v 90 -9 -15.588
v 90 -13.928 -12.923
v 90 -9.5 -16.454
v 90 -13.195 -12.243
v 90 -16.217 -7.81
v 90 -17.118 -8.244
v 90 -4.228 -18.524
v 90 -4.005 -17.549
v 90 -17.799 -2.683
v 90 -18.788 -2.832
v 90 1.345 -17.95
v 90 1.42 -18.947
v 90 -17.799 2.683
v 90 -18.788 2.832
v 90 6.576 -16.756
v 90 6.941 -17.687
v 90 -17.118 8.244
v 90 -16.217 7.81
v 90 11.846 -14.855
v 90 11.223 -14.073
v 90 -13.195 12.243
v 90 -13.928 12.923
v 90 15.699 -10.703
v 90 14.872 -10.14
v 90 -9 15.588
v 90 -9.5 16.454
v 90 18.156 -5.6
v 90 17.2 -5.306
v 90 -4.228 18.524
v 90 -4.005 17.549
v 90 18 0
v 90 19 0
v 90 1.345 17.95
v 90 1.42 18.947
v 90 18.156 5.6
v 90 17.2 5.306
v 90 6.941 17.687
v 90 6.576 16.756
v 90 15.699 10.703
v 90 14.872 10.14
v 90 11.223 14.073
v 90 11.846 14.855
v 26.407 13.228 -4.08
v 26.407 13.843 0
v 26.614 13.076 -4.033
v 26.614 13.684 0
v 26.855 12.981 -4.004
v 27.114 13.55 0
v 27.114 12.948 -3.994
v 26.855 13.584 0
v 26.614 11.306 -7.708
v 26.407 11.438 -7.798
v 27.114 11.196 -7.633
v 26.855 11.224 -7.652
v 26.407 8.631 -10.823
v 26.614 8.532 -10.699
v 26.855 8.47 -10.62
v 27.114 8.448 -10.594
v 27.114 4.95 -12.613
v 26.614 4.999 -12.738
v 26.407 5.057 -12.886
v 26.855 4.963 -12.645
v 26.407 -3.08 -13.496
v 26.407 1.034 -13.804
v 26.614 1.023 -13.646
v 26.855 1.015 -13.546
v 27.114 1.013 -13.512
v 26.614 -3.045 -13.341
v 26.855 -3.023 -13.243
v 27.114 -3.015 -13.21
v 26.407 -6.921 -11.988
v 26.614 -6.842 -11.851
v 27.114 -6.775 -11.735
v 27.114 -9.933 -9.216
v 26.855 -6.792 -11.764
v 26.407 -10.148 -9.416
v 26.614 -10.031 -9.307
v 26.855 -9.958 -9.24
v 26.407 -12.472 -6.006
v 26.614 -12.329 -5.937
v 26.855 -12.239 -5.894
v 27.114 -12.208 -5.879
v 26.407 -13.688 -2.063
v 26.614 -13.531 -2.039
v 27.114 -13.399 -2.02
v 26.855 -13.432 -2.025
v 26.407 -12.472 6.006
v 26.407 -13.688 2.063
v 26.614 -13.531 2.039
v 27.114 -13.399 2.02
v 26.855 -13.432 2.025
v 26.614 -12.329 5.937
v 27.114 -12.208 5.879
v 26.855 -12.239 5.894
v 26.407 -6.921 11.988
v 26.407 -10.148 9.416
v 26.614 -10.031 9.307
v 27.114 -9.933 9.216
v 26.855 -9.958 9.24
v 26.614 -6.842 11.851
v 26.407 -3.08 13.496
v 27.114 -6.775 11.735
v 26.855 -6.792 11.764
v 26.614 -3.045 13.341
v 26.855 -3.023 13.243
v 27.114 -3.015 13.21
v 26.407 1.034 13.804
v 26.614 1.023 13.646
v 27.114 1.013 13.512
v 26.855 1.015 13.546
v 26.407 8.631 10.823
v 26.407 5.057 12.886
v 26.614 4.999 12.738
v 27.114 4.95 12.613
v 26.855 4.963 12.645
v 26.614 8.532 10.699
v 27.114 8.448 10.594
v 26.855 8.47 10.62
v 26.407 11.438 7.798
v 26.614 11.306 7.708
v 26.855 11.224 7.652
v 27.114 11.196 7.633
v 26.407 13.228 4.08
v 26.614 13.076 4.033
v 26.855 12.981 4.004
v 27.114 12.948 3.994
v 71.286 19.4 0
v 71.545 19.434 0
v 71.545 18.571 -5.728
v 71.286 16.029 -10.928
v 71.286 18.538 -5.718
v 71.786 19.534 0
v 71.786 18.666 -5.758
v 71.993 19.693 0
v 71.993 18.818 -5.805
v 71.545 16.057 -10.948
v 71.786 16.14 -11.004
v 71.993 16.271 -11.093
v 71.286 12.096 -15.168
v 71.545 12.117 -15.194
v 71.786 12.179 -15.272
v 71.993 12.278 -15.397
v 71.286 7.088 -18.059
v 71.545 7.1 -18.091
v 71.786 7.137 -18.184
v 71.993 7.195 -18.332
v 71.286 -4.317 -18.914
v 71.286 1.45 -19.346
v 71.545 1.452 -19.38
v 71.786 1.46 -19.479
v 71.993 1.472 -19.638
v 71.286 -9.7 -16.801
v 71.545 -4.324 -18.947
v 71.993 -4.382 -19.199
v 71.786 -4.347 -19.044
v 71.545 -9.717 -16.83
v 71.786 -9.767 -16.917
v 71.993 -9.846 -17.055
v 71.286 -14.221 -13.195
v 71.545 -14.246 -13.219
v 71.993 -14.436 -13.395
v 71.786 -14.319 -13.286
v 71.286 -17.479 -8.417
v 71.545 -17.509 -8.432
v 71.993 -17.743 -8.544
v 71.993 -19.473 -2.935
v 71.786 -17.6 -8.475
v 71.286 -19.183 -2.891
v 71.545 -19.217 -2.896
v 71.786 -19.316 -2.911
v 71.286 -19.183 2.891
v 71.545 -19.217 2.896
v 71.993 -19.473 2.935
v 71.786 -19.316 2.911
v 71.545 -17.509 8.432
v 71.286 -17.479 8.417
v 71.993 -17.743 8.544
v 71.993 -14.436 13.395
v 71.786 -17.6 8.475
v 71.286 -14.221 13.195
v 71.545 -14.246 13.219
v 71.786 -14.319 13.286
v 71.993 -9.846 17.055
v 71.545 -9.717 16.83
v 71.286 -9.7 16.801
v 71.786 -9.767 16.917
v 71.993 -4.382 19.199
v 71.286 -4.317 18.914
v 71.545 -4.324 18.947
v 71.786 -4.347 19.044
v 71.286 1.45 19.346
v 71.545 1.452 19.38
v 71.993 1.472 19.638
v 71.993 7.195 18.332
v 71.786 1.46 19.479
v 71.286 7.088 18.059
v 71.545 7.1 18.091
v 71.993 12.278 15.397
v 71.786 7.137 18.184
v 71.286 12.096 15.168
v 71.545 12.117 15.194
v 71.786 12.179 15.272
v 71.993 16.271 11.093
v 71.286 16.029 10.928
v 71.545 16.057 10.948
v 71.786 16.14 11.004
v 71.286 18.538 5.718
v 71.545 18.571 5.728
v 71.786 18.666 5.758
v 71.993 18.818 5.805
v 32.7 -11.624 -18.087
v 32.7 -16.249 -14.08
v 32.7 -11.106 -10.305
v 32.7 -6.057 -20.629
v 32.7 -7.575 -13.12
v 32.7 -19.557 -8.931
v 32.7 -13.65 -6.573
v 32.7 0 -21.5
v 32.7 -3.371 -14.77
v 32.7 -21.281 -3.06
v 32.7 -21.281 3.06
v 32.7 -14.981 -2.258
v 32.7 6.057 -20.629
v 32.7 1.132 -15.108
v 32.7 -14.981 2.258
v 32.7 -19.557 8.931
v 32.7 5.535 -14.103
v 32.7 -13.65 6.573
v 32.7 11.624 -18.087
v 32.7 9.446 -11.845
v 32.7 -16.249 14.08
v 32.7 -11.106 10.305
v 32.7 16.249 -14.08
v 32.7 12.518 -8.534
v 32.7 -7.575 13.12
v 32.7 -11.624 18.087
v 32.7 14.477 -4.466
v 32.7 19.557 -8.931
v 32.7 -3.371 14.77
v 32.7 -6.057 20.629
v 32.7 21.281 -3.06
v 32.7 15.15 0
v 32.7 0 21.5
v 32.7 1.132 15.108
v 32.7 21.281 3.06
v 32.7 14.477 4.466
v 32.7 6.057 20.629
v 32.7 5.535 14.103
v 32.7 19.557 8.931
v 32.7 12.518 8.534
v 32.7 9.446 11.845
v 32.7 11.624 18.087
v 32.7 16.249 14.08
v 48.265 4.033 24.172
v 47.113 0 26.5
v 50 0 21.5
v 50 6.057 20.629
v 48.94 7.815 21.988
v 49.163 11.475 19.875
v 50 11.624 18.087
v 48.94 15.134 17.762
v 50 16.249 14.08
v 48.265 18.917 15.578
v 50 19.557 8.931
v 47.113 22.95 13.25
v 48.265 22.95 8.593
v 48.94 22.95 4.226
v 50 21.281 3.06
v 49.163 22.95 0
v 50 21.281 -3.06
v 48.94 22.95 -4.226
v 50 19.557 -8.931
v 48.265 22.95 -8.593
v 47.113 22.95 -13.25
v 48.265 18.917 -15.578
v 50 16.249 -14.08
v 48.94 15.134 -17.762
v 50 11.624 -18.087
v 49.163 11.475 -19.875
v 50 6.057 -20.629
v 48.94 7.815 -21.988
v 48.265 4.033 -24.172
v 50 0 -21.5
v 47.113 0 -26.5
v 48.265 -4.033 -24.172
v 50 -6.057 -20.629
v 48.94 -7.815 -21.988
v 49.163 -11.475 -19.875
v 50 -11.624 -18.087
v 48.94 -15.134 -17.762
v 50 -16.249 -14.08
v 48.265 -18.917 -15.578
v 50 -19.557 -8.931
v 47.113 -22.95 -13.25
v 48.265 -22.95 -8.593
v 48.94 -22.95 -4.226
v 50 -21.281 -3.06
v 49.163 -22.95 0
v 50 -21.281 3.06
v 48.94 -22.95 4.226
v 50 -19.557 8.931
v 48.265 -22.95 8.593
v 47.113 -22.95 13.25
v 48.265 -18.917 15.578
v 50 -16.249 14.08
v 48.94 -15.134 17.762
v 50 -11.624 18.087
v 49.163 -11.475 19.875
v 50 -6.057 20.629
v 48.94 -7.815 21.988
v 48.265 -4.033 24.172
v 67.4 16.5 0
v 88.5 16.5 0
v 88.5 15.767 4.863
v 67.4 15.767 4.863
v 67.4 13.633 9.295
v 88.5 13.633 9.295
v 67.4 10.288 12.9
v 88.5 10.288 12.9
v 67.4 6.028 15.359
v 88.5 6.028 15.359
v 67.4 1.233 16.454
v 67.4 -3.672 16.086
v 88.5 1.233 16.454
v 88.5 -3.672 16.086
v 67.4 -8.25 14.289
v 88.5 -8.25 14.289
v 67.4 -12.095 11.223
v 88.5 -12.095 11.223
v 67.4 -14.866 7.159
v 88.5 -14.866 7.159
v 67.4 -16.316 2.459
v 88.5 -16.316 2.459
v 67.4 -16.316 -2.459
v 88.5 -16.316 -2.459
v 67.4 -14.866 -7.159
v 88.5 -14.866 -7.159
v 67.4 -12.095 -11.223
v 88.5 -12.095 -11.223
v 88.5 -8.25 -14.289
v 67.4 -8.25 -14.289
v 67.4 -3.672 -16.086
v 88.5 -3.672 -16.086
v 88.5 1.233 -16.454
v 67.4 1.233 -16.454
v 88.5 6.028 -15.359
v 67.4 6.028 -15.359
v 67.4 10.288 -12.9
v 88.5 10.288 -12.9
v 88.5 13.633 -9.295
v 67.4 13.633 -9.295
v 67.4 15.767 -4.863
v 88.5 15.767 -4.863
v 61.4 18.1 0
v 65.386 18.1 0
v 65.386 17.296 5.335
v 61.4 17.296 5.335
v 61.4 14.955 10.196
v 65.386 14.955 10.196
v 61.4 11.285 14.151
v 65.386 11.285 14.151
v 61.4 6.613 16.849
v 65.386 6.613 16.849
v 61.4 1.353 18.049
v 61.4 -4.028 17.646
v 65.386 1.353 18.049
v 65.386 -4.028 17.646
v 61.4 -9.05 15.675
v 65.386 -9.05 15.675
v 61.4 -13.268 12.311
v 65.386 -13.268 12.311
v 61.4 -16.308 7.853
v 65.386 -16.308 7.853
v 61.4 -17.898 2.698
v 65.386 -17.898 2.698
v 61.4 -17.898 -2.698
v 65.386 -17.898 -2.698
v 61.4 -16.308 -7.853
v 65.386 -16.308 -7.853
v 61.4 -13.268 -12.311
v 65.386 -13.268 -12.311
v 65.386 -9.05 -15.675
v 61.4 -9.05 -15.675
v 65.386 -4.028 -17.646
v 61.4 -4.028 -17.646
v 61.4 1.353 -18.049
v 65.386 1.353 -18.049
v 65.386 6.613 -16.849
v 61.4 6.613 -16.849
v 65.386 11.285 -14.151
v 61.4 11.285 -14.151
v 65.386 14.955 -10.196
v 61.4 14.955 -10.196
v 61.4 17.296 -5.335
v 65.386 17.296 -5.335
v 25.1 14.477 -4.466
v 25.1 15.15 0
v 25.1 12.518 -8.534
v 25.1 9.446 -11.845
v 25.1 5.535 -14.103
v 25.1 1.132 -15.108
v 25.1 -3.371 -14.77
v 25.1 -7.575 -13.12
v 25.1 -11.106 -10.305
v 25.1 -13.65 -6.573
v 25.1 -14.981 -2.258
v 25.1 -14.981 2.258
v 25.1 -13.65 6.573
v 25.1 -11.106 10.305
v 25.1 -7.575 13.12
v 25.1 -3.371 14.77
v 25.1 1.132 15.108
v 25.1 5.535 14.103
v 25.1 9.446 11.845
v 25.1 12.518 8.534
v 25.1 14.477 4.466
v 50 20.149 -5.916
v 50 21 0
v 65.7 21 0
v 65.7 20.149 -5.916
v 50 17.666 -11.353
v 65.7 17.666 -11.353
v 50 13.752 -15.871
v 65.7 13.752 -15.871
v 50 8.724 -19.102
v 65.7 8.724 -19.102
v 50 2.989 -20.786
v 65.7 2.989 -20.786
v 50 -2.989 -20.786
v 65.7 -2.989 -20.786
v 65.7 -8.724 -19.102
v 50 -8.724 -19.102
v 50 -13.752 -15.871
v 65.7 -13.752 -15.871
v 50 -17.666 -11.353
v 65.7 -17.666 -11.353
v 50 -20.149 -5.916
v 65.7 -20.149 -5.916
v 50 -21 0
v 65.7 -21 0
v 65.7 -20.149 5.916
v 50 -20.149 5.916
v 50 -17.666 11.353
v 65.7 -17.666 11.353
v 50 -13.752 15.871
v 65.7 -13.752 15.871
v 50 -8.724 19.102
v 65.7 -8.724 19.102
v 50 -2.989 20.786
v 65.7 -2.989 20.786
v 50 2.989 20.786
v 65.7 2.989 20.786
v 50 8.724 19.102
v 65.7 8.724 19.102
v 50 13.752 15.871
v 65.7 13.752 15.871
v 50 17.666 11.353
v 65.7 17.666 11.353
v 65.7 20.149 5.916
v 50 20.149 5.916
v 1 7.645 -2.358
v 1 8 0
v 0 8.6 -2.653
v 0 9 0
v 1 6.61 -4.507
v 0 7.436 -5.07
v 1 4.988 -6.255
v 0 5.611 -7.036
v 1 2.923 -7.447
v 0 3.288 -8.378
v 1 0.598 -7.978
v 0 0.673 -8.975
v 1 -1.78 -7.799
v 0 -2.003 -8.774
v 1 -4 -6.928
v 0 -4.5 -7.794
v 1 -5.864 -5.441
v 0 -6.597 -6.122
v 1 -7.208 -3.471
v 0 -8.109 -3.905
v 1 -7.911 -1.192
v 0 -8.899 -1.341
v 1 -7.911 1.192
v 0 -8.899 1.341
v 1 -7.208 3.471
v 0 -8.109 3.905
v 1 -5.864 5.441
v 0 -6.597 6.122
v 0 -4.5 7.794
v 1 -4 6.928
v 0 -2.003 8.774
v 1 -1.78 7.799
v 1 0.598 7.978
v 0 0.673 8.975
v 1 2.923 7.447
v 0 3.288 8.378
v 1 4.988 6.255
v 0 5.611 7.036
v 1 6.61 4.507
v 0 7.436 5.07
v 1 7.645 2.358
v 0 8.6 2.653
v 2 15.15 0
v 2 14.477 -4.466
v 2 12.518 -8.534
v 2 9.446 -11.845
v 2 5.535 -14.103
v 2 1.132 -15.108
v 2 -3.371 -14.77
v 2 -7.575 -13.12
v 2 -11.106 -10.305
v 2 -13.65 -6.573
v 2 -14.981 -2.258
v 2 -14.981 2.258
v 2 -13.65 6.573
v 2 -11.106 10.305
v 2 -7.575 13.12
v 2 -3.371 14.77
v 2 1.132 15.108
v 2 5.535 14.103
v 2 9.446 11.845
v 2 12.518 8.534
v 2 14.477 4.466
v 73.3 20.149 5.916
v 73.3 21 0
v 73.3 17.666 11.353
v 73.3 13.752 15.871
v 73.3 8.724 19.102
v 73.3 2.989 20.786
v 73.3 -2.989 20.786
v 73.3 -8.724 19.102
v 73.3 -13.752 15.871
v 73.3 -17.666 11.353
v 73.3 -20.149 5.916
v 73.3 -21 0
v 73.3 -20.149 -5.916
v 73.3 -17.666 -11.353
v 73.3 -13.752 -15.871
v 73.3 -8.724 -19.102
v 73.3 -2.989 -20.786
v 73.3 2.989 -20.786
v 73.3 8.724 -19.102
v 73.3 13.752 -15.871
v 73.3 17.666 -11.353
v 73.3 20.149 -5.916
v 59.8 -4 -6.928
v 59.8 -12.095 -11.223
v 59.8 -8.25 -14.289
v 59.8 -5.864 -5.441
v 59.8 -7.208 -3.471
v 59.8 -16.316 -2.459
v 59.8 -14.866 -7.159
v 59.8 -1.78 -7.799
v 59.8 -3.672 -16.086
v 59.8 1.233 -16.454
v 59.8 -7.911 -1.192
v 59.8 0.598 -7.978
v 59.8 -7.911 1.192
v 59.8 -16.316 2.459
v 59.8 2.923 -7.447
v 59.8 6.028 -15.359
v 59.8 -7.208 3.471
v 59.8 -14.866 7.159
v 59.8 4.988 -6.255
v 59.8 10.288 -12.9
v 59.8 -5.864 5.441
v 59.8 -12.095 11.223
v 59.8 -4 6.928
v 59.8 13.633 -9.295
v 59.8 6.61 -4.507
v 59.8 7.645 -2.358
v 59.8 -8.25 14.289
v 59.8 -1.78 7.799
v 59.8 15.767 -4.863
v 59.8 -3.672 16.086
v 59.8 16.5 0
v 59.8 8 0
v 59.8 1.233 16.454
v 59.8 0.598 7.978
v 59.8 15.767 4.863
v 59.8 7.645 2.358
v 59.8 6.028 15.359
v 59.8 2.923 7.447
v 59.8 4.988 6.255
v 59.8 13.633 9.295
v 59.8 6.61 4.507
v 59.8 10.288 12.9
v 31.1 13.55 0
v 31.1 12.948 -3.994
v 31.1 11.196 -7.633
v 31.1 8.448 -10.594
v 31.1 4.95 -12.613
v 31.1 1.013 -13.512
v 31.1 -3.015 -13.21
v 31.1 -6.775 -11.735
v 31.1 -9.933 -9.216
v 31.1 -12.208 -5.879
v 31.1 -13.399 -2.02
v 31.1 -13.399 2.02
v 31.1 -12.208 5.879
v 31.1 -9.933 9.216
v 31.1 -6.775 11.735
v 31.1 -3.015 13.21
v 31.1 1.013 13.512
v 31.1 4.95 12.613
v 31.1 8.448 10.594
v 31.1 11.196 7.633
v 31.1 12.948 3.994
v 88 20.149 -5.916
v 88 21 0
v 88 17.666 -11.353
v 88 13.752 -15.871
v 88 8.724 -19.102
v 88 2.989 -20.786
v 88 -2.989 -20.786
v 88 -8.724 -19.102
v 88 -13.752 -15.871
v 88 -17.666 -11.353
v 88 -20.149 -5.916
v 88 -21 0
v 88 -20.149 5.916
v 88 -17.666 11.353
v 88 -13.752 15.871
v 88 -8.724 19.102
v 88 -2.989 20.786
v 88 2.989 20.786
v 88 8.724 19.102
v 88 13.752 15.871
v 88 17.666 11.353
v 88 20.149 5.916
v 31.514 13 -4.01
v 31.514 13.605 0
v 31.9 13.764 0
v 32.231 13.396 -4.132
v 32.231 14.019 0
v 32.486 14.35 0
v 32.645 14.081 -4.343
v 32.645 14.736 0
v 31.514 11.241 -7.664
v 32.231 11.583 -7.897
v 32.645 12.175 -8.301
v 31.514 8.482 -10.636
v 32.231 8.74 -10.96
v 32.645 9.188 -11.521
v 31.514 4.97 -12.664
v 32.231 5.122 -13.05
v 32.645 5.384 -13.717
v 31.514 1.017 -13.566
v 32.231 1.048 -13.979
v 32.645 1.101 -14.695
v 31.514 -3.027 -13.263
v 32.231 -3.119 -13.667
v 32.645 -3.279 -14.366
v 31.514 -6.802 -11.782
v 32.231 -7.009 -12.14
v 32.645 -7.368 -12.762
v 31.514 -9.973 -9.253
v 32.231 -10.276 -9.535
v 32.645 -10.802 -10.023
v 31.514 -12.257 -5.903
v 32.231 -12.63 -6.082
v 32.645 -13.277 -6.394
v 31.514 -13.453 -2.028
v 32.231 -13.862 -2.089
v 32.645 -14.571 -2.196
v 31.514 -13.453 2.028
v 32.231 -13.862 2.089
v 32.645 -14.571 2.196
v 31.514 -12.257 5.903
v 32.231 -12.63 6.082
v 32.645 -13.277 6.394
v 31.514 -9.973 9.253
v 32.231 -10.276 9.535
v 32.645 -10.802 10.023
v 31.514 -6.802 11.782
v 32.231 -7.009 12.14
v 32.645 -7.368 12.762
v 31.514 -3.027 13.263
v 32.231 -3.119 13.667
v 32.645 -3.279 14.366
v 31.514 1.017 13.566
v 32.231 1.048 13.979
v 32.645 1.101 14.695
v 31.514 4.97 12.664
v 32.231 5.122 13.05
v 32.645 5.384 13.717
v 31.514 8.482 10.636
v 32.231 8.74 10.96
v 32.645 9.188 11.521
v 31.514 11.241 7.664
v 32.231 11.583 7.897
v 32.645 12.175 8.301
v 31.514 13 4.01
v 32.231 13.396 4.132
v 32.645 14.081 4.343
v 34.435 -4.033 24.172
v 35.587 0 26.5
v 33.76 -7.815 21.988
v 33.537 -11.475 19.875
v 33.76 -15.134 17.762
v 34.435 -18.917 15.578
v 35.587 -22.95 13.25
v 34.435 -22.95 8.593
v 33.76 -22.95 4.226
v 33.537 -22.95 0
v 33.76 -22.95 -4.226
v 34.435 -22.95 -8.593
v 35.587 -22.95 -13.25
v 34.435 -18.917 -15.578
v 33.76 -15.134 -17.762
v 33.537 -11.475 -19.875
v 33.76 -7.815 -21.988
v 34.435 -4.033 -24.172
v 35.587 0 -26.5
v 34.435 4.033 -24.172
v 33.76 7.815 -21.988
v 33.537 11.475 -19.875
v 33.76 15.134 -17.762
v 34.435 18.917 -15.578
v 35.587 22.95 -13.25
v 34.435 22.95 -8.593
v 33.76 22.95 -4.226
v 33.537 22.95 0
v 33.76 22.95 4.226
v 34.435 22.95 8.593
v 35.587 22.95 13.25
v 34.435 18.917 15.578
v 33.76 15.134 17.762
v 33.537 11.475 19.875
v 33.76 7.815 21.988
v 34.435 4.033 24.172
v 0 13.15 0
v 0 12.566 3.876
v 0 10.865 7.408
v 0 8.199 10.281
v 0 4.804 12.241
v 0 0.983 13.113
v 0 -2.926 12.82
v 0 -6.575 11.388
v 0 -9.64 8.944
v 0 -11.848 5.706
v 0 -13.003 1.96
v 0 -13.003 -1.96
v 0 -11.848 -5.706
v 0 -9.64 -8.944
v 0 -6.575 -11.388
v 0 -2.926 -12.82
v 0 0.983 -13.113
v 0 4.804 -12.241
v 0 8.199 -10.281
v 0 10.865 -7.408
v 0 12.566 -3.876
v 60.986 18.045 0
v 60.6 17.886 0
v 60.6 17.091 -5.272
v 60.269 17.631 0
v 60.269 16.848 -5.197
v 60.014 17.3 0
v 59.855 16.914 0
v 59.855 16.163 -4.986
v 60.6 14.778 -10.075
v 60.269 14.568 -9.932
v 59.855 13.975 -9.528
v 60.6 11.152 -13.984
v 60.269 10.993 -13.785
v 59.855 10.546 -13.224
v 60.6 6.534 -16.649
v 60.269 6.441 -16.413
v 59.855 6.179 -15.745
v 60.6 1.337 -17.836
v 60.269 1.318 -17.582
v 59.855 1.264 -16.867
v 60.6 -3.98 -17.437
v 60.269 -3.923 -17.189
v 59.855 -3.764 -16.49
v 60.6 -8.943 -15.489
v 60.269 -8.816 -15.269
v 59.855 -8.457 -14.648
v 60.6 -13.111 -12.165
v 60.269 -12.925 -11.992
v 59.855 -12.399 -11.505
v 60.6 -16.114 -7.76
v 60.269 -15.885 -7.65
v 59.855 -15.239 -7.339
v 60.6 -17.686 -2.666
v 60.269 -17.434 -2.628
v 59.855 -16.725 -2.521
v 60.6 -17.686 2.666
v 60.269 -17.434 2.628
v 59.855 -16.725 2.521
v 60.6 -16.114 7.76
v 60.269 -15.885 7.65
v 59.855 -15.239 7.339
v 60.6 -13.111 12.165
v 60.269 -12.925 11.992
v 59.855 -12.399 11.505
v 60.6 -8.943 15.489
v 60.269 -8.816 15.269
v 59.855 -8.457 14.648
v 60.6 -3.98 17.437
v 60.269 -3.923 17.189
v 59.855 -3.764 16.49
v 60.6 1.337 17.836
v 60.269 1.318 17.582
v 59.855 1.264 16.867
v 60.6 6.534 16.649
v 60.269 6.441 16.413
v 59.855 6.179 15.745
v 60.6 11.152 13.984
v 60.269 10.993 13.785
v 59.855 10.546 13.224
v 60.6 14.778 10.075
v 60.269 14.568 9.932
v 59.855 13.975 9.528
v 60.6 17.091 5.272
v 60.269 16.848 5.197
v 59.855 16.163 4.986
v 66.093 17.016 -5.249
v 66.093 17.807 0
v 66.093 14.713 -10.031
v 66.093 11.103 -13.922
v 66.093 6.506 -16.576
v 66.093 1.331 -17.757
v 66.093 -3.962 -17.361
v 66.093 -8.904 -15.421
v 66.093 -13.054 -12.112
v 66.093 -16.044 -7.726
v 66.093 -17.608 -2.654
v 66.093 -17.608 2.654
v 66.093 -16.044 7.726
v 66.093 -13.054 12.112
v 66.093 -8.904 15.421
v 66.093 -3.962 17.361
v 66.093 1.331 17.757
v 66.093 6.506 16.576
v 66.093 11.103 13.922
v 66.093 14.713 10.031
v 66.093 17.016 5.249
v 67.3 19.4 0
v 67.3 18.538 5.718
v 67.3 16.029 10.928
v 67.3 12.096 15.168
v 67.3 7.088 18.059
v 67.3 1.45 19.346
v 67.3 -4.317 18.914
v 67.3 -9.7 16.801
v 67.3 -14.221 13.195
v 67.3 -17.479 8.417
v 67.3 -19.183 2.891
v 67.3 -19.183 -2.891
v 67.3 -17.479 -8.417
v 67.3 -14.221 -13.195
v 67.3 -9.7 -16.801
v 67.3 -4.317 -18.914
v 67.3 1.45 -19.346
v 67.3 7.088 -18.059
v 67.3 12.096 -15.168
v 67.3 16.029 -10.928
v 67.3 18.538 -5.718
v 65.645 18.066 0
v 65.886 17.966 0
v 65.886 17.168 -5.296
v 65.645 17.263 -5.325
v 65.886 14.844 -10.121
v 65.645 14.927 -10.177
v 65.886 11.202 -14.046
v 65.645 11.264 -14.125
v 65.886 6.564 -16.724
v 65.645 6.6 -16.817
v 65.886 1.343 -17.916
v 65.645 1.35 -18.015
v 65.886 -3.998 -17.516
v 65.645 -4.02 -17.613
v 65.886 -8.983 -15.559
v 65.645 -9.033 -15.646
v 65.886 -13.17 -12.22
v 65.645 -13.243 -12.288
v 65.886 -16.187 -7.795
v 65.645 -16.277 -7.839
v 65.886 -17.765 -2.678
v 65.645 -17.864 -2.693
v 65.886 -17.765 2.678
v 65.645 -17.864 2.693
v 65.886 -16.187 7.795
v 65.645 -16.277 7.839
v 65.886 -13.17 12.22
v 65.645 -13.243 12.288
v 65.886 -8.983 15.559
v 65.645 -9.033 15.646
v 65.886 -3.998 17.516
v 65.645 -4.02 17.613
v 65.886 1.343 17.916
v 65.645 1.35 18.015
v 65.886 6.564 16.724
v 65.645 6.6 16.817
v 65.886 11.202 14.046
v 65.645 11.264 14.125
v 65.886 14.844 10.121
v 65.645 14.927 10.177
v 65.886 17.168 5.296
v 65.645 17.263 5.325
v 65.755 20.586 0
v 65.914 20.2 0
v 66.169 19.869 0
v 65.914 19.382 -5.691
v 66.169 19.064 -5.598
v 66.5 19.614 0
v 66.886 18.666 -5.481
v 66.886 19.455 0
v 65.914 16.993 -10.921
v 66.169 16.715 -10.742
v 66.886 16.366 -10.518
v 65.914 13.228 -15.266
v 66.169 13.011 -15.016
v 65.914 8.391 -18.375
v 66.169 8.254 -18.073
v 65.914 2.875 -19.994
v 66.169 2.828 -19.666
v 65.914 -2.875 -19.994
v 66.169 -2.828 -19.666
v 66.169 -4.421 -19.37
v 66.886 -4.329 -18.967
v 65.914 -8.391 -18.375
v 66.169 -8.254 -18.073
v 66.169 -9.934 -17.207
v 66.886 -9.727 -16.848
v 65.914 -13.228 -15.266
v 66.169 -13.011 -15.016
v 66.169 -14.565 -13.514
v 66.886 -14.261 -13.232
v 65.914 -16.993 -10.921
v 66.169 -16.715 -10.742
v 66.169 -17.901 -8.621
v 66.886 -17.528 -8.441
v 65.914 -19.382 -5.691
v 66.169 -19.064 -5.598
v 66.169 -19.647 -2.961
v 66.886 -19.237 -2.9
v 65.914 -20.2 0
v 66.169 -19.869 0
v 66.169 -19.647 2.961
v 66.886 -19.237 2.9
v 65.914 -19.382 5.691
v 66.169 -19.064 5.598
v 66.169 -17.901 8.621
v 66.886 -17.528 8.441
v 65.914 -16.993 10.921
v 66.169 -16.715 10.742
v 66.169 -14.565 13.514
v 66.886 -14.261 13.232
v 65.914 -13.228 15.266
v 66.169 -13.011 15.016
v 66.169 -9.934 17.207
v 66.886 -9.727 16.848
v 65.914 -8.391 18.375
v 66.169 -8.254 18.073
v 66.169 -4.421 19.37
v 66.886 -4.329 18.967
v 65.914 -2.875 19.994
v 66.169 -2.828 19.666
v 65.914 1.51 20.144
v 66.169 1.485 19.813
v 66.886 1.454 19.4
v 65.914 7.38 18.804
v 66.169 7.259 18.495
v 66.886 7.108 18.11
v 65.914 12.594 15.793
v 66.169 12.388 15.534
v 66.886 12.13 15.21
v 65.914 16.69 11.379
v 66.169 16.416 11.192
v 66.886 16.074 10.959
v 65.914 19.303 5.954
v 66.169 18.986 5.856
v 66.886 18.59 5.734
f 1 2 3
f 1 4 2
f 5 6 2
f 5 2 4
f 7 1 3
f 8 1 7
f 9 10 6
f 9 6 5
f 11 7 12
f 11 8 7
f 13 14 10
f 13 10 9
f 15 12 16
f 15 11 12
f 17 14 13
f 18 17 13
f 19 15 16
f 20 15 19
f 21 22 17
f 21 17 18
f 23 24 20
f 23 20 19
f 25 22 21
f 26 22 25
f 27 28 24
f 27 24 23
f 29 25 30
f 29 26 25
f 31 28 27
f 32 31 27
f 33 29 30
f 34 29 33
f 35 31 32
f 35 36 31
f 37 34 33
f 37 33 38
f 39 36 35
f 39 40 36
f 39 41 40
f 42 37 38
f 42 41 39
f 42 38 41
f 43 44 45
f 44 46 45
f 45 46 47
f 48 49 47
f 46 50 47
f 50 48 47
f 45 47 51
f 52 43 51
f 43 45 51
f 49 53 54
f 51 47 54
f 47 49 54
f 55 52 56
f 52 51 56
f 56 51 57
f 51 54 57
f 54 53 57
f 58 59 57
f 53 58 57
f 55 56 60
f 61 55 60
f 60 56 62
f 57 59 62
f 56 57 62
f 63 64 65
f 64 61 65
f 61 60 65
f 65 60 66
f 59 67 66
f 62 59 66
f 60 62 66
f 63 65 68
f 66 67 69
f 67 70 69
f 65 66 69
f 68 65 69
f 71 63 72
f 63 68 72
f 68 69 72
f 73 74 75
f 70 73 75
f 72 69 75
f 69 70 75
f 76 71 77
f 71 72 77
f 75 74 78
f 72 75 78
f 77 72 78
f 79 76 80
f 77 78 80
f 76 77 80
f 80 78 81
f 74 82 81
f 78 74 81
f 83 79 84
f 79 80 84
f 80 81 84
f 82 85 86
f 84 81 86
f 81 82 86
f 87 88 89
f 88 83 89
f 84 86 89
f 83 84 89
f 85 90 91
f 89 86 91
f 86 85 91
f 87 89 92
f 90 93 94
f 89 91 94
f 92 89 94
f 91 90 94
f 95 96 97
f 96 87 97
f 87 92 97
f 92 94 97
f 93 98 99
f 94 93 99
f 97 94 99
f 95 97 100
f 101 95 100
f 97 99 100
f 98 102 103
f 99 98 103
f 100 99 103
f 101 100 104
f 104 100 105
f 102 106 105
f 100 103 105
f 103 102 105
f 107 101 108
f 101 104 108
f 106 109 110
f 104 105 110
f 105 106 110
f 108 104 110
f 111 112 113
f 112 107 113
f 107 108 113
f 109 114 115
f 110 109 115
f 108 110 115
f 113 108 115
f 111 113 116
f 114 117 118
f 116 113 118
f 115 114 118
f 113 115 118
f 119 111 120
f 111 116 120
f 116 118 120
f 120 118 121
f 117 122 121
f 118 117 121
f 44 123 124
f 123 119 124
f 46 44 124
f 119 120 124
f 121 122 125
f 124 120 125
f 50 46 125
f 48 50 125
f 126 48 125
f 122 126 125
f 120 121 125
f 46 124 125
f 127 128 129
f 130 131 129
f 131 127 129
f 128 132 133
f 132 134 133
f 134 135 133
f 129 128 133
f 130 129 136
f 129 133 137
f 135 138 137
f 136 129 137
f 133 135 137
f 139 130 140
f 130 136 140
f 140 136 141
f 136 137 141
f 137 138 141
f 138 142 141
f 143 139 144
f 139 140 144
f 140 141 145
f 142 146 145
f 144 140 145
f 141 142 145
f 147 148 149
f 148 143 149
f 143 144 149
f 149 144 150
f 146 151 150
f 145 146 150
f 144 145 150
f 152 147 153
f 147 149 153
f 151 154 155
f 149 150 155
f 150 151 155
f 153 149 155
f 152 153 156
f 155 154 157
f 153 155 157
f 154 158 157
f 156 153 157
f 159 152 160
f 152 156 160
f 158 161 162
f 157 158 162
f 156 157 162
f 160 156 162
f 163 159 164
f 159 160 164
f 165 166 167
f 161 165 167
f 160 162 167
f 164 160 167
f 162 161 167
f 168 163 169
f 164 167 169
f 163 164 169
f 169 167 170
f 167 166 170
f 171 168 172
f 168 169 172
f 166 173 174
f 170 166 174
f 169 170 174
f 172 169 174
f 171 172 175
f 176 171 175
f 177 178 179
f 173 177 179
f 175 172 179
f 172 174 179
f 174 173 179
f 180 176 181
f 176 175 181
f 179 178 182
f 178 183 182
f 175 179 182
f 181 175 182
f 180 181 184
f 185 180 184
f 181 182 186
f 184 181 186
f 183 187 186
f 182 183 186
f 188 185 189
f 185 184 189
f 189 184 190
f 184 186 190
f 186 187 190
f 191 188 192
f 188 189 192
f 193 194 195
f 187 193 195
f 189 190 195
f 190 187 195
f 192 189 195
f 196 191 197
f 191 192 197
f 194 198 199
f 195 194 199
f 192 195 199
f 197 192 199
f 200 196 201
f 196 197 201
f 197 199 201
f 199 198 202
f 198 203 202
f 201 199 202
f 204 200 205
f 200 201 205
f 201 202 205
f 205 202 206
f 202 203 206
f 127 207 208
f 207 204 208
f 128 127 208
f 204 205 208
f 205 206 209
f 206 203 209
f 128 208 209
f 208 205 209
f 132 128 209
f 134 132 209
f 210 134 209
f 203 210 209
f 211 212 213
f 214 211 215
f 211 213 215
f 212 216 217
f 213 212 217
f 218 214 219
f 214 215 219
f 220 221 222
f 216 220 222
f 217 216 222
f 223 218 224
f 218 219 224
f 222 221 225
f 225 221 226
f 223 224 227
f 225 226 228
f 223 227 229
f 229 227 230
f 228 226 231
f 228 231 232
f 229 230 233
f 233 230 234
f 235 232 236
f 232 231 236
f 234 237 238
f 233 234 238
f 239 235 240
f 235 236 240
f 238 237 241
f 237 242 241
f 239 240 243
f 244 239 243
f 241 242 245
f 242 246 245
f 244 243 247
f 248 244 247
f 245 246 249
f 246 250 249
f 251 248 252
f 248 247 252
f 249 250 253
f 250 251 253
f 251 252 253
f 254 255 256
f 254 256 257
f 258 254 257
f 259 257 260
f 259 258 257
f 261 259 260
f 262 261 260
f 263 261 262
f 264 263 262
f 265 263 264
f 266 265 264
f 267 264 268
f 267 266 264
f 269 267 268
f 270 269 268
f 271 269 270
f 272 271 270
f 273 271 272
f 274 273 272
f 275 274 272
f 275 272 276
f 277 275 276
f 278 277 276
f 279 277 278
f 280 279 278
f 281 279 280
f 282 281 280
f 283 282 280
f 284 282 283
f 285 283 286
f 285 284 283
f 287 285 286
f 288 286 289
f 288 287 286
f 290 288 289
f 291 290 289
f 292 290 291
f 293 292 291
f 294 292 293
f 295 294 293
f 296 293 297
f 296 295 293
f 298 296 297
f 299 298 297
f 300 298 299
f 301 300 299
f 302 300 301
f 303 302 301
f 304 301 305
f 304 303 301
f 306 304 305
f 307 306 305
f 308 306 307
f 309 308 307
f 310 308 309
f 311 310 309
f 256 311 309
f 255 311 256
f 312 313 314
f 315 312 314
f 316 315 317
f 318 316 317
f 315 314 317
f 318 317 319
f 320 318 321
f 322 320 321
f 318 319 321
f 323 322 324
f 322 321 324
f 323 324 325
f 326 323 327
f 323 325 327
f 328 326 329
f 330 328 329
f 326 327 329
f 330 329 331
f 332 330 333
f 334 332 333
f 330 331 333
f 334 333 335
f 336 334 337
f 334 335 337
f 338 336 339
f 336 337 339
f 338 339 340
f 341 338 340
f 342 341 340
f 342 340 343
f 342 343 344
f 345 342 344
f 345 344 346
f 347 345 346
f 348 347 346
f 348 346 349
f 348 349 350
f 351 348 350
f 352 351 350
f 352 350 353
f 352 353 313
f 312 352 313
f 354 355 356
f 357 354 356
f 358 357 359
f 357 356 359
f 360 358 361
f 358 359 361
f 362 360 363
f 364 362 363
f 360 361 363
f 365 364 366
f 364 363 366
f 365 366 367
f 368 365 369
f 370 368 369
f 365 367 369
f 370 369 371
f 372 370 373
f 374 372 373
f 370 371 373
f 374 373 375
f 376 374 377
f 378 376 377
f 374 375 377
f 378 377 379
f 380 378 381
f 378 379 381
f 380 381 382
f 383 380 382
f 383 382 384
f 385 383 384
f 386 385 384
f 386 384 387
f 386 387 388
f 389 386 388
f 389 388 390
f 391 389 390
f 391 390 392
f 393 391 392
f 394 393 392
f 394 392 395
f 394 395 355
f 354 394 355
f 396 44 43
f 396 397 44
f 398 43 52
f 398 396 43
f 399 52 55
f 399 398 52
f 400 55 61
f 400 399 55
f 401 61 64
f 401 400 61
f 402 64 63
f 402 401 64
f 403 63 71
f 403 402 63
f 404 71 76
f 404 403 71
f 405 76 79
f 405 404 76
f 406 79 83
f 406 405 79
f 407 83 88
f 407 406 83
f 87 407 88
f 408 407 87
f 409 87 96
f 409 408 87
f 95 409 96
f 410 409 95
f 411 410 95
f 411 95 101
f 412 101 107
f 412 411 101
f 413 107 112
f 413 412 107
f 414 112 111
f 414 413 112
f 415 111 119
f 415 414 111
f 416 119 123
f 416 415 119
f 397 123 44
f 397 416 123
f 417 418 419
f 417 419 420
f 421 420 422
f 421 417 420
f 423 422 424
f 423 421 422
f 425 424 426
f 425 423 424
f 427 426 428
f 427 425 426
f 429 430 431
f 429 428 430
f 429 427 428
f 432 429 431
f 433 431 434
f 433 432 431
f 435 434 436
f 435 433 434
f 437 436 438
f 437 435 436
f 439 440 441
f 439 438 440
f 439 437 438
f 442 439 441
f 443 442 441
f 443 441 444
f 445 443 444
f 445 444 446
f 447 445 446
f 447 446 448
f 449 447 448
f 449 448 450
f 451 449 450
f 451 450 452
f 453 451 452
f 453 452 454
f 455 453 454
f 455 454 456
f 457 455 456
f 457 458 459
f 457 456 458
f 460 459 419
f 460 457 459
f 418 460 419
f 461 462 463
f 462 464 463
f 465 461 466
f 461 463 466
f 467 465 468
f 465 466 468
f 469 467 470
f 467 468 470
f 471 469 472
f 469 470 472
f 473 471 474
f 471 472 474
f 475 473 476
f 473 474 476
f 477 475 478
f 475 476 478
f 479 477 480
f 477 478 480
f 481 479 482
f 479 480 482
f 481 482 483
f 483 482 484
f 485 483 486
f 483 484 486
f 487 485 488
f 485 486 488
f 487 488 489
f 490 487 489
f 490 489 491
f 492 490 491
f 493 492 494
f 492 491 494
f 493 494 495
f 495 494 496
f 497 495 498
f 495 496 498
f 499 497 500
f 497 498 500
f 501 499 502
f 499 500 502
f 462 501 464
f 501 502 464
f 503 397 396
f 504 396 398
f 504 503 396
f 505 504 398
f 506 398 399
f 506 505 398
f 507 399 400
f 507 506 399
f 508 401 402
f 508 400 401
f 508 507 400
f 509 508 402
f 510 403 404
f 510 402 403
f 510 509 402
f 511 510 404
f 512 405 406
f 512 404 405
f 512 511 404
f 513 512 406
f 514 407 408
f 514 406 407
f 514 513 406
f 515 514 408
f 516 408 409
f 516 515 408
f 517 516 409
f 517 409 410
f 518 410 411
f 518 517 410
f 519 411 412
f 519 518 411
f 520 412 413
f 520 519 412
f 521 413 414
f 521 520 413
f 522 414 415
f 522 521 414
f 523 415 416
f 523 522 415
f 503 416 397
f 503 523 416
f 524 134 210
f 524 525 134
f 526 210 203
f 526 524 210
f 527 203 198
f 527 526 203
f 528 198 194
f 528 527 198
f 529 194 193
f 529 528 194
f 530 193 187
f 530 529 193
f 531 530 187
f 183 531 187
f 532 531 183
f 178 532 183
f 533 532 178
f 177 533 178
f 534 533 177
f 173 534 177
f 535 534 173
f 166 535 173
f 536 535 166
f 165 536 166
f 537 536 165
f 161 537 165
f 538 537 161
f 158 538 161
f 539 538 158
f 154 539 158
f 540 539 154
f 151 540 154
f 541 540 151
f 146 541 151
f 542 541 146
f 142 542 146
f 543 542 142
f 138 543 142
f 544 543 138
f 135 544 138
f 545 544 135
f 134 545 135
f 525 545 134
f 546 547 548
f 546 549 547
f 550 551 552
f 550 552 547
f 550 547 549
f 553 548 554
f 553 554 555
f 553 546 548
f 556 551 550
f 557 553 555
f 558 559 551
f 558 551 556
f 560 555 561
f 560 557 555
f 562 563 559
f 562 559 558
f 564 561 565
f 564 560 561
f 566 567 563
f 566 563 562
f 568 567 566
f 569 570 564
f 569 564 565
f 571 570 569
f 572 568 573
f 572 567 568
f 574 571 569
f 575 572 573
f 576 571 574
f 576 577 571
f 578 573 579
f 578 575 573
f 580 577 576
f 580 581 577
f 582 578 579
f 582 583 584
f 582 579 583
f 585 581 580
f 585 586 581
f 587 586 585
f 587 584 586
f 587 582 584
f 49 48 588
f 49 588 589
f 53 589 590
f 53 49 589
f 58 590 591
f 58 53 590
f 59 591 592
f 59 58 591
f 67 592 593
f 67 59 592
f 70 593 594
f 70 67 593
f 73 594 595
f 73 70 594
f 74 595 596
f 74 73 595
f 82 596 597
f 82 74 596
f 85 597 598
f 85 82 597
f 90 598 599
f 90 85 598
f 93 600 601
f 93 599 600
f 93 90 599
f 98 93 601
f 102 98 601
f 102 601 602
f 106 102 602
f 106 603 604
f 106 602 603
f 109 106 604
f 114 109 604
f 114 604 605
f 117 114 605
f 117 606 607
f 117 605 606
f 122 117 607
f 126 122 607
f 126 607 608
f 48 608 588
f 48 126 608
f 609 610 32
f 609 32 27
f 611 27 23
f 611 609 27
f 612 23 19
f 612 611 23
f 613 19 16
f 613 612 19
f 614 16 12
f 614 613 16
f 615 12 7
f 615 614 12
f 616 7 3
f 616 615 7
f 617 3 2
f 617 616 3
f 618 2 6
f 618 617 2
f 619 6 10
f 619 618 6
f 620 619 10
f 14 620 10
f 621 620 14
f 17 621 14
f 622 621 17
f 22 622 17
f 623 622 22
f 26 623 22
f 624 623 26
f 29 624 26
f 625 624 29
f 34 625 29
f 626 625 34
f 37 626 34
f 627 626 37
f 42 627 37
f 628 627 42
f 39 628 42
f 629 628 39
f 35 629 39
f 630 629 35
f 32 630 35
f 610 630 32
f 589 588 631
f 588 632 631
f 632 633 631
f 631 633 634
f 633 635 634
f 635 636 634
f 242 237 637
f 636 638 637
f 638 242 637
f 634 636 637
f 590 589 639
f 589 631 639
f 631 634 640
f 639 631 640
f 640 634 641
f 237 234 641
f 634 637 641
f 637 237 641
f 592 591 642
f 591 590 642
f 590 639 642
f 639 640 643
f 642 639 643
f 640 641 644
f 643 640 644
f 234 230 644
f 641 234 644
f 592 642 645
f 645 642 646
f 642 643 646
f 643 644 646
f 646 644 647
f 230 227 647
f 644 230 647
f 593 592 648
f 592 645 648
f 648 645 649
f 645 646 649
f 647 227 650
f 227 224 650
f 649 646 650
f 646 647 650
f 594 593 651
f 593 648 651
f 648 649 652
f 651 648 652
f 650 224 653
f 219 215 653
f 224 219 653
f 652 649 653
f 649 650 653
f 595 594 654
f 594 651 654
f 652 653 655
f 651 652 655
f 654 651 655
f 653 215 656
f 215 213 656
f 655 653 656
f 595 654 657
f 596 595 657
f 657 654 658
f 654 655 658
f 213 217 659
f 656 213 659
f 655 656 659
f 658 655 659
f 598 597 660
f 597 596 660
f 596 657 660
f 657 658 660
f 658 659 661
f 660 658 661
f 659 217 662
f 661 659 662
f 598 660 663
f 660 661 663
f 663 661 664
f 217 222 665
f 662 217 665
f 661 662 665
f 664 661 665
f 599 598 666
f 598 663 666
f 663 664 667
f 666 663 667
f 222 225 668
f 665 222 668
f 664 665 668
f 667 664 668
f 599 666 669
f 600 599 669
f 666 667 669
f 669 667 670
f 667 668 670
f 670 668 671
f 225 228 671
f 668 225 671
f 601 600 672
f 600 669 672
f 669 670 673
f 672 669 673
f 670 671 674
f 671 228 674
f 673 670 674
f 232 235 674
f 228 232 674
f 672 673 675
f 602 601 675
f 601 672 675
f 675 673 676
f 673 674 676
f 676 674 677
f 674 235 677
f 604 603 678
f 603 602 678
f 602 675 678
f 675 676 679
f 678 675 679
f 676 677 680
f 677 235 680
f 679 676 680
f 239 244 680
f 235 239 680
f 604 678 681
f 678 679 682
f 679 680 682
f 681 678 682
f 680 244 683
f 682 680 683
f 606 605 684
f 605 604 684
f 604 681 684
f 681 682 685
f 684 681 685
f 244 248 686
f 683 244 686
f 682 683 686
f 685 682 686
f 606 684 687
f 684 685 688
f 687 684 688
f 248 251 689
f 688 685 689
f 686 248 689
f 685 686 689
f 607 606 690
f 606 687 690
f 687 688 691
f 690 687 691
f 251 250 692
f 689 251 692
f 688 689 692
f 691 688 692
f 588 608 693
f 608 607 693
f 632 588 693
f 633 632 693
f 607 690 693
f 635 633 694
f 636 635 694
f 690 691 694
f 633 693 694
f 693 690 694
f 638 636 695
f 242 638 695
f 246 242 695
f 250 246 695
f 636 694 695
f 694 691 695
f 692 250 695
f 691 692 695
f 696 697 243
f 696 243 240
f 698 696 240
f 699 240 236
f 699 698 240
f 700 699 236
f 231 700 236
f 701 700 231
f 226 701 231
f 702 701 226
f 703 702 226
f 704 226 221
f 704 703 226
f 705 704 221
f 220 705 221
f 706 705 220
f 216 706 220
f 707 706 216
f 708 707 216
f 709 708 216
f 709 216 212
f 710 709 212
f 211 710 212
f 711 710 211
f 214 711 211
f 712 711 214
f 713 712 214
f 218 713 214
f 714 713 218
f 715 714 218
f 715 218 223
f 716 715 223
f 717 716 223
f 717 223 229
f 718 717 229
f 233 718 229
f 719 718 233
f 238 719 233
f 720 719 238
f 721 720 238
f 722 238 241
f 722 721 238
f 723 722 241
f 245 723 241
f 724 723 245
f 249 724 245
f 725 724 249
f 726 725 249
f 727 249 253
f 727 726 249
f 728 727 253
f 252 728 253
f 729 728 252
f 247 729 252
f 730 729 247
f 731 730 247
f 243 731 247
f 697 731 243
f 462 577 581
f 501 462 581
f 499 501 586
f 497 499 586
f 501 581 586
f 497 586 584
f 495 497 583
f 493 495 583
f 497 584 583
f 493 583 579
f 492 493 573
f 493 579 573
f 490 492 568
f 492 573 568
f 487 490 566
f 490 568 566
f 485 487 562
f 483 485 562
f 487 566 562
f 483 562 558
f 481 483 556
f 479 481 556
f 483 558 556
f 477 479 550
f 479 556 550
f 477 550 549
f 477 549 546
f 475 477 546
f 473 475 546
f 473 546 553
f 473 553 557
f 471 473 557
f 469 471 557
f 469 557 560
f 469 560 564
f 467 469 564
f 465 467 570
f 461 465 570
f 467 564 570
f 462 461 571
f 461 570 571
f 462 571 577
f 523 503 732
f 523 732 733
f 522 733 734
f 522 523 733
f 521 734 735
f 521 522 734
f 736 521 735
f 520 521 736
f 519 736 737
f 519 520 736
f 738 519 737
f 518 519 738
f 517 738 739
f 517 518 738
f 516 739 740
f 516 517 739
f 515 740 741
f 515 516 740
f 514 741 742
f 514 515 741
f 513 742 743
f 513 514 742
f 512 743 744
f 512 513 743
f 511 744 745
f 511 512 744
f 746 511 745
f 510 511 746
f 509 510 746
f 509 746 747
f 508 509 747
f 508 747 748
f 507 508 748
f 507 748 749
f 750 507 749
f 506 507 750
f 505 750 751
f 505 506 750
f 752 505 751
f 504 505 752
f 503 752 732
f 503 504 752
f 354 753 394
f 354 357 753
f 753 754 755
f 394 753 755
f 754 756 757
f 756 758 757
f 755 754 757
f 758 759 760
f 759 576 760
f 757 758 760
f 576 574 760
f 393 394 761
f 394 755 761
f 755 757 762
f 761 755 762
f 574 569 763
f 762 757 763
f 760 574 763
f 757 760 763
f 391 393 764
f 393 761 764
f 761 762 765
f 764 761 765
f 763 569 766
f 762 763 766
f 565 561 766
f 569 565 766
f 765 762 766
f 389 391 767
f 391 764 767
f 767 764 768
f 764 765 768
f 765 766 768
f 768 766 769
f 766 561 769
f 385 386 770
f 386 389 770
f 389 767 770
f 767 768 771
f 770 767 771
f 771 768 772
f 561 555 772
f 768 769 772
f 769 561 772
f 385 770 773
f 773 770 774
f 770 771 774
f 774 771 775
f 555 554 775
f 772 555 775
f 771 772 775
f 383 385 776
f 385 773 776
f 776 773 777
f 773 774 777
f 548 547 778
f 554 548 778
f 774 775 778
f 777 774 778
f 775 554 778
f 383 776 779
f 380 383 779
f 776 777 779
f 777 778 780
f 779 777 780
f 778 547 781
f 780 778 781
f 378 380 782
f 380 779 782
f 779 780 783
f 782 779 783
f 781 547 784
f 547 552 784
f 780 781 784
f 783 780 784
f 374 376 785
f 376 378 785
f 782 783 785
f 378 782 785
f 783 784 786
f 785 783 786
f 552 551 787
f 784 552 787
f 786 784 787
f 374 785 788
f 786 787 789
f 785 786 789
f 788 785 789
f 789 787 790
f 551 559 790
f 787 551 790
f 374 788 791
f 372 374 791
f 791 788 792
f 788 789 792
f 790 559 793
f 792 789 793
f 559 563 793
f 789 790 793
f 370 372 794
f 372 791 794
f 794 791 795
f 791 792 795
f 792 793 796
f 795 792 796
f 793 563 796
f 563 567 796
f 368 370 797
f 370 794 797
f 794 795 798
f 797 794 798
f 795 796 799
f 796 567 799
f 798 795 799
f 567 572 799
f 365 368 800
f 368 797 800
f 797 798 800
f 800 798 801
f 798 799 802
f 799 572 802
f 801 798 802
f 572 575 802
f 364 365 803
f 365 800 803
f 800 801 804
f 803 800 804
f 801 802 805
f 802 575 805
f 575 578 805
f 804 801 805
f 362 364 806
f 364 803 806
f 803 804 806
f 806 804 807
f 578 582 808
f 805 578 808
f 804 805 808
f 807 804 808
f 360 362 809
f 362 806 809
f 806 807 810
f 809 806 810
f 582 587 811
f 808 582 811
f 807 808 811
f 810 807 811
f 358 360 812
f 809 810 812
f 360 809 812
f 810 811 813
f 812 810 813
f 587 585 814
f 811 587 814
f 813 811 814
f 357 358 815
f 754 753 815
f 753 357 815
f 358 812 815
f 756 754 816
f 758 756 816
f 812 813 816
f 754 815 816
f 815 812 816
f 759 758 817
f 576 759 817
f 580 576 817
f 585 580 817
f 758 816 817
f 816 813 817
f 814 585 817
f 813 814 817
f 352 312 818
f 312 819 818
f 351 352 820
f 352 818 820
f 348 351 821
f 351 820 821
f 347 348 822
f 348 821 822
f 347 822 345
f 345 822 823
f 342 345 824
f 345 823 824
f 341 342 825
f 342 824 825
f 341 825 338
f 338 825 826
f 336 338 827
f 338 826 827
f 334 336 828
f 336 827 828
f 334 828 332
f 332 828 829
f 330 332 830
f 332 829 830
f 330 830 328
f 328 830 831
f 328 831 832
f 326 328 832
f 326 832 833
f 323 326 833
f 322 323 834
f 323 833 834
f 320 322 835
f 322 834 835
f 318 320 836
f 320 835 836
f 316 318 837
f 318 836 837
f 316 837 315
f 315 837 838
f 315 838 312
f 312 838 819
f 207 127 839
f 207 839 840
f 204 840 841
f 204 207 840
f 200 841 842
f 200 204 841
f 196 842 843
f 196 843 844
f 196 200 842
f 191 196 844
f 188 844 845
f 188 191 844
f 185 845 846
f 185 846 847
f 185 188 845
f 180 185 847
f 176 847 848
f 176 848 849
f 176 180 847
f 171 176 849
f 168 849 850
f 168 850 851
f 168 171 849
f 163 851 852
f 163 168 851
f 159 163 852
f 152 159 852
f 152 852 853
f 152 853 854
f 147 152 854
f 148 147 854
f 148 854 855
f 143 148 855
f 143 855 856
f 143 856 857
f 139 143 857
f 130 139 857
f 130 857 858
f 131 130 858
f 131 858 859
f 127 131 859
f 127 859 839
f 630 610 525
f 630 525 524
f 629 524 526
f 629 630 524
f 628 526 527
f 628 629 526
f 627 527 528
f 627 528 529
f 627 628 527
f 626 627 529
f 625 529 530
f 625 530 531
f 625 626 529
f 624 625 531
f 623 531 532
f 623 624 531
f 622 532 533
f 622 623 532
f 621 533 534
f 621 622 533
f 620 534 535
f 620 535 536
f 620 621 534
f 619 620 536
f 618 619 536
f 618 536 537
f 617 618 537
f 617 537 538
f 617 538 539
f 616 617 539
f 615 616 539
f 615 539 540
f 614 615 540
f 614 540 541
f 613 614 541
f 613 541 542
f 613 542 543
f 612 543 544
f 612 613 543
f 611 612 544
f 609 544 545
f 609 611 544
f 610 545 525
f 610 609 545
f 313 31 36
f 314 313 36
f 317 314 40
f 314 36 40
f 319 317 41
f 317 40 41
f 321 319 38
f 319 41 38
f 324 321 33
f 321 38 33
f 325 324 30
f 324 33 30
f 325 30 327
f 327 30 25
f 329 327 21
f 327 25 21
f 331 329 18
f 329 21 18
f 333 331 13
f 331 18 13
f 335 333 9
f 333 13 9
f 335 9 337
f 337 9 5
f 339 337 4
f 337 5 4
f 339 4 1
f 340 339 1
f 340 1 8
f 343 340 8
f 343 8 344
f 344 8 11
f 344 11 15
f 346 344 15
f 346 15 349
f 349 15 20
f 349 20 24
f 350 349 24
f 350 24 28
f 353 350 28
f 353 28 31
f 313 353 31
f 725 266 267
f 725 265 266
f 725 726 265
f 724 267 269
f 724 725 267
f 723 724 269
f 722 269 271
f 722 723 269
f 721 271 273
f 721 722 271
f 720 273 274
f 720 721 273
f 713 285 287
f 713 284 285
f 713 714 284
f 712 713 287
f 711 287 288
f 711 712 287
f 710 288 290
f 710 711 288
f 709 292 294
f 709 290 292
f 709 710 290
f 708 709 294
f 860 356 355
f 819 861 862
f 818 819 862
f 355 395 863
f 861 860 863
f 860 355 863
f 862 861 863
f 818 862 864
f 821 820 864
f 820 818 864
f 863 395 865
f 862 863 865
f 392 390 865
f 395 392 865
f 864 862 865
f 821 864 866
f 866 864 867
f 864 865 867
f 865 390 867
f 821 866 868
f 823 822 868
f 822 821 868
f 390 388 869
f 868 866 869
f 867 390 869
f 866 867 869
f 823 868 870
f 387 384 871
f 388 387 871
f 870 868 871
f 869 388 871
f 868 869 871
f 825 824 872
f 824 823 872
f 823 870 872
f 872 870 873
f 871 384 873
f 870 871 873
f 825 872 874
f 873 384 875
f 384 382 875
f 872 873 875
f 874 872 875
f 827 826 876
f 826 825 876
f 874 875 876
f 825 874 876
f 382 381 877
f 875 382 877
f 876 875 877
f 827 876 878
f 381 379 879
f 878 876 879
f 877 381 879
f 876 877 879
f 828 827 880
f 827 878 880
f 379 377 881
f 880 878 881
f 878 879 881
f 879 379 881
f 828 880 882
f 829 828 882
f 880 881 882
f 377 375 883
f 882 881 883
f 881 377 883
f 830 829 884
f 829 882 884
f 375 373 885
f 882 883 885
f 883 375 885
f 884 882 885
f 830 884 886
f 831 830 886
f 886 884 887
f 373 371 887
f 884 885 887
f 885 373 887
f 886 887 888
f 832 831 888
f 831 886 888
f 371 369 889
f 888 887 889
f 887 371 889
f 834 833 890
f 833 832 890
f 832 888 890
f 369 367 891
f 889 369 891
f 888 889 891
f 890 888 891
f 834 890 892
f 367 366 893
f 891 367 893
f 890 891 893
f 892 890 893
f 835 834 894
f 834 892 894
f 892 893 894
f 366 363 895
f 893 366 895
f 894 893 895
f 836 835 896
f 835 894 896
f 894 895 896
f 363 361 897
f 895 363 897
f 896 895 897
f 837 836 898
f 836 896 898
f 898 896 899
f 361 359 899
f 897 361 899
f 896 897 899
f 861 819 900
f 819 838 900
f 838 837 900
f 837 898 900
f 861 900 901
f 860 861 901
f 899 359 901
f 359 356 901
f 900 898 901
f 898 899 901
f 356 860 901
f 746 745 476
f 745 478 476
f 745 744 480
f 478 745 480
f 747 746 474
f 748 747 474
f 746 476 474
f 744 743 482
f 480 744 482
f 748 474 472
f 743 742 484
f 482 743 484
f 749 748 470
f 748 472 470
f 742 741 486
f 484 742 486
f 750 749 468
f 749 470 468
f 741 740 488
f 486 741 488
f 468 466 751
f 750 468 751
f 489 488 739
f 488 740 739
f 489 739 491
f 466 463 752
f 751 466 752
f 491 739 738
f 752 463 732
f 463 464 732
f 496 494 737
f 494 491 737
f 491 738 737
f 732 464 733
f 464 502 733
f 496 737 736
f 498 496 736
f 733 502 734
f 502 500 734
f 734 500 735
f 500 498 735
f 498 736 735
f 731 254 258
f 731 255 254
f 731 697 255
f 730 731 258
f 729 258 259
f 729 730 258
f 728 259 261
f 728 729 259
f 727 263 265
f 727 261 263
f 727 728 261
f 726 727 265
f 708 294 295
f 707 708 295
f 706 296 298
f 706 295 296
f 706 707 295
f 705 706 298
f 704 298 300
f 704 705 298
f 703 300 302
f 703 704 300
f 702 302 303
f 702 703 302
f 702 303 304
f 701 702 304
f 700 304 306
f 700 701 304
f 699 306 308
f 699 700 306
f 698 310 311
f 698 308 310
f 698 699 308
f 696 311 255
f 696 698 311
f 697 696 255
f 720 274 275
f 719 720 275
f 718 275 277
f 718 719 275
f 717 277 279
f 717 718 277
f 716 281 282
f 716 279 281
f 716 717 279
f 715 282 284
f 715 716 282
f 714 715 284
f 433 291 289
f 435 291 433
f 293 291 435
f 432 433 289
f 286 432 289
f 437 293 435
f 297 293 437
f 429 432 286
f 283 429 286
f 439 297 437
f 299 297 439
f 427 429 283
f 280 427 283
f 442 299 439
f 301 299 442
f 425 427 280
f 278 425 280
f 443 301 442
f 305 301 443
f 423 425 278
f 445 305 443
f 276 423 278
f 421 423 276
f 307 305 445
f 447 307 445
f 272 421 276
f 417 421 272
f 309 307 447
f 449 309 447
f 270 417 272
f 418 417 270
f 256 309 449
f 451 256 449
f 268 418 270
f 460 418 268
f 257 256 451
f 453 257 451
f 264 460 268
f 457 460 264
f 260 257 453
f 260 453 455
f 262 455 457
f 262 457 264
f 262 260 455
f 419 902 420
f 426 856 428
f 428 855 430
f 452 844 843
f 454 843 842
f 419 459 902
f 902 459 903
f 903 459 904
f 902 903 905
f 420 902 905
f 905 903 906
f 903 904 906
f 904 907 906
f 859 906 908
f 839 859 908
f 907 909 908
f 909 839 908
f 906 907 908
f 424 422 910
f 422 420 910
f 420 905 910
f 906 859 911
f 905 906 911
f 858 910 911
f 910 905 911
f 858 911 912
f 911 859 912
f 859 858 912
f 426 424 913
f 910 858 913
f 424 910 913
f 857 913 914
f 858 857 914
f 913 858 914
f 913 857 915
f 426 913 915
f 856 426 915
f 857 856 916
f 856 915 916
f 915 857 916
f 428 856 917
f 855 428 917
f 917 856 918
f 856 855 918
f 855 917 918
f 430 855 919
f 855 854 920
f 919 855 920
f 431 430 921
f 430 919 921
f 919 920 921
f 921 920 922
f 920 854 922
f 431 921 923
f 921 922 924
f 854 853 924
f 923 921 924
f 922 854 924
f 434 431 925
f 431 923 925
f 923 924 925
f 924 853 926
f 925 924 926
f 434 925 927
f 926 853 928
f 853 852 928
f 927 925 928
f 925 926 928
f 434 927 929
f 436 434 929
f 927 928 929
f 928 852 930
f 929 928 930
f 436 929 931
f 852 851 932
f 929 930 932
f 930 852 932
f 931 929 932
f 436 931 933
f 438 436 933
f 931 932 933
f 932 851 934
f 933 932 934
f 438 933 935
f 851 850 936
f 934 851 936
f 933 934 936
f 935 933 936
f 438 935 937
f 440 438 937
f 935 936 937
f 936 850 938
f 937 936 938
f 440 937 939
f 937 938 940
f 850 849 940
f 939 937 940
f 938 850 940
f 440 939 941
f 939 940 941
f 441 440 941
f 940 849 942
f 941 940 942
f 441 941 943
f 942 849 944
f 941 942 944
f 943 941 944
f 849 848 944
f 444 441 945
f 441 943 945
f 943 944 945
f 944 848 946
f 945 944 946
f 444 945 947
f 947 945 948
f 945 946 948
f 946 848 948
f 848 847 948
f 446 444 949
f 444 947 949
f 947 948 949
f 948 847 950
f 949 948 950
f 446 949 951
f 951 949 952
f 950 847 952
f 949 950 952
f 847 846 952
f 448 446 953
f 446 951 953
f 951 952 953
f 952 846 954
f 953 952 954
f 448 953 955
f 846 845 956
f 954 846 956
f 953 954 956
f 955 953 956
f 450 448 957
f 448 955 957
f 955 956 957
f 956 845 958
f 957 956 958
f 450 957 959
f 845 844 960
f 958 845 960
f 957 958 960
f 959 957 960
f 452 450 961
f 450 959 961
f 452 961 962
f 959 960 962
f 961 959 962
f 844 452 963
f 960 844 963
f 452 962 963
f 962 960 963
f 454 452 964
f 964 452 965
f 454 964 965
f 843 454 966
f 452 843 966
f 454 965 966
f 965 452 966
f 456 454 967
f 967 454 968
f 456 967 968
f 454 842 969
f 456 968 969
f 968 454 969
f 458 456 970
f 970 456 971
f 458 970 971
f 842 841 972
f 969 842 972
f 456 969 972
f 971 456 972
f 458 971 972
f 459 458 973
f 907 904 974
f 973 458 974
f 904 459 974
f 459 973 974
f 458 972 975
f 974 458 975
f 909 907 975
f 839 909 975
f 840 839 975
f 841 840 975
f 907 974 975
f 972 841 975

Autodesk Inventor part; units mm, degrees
ref_plane "YZ Plane" through (0, 0, 0) normal (1, 0, 0) x (0, 1, 0)
ref_plane "XZ Plane" through (0, 0, 0) normal (0, 1, 0) x (-1, 0, 0)
ref_plane "XY Plane" through (0, 0, 0) normal (0, 0, 1) x (1, 0, 0)
sketch "Эскиз1" plane through (0, 0, 0) normal (0, 0, 1) x (1, 0, 0)
  line L0 (0, 8) -> (0, 15.15)
  line L1 (32.7, 15.15) -> (32.7, 15.15)
  line L2 (31.1, 13.55) -> (27.1142, 13.55)
  line L3 (26.4071, 13.8429) -> (25.1, 15.15)
  line L4 (25.1, 15.15) -> (0, 15.15)
  line L5 (-18, 0) -> (108, 0) projected
  arc A0 (31.1, 13.55) -> (32.7, 15.15) centre (31.1, 15.15) ccw
  arc A1 (26.4071, 13.8429) -> (27.1142, 13.55) centre (27.1142, 14.55) ccw
  line L6 (0, 8) -> (59.8, 8)
  line L7 (65.7, 21) -> (50, 21)
  line L8 (50, 21) -> (50, 26.5)
  line L9 (65.7, 21) -> (65.7, 21)
  line L10 (67.3, 19.4) -> (71.2858, 19.4)
  line L11 (71.9929, 19.6929) -> (73.3, 21)
  line L12 (73.3, 21) -> (90, 21)
  arc A2 (65.7, 21) -> (67.3, 19.4) centre (67.3, 21) ccw
  arc A3 (71.2858, 19.4) -> (71.9929, 19.6929) centre (71.2858, 20.4) ccw
  line L13 (32.7, 15.15) -> (32.7, 26.5)
  line L14 (32.7, 26.5) -> (50, 26.5)
  line L15 (59.8, 8) -> (59.8, 16.5)
  line L16 (59.8, 16.5) -> (59.8, 16.5)
  line L17 (61.4, 18.1) -> (65.3858, 18.1)
  line L18 (66.0929, 17.8071) -> (67.4, 16.5)
  line L19 (67.4, 16.5) -> (90, 16.5)
  line L20 (90, 16.5) -> (90, 21)
  arc A4 (66.0929, 17.8071) -> (65.3858, 18.1) centre (65.3858, 17.1) ccw
  arc A5 (61.4, 18.1) -> (59.8, 16.5) centre (61.4, 16.5) ccw
  point P0 (0, 0)
  point P1 (32.7, 13.55)
  point P2 (26.7, 13.55)
  point P3 (65.7, 19.4)
  point P4 (71.7, 19.4)
  point P5 (59.8, 18.1)
  point P6 (65.8, 18.1)
  dimension "d0" = 8
  dimension "d1" = 7.15
  dimension "d2" = 32.7
  dimension "d4" = 1.6
  dimension "d5" = 6
  dimension "d6" = 135
  dimension "d7" = 13.55
  dimension "d9" = 1.6
  dimension "d10" = 1
  dimension "d11" = 59.8
  dimension "d14" = 24.3
  dimension "d15" = 1.6
  dimension "d16" = 6
  dimension "d17" = 135
  dimension "d18" = 19.4
  dimension "d19" = 1.6
  dimension "d20" = 1
  dimension "d22" = 30.2
  dimension "d24" = 26.5
  dimension "d25" = 1.6
  dimension "d26" = 6
  dimension "d27" = 135
  dimension "d28" = 1
  dimension "d29" = 1.6
  dimension "d30" = 90
  dimension "d31" = 21
  dimension "d32" = 16.5
  dimension "d33" = 18.1
  dimension "d34" = 8
  dimension "d35" = 40
revolve "Вращение1" add sketch "Эскиз1" angle 360 about axis through (-10, 0, 0) along (1, 0, 0)
sketch "Эскиз2" plane through (0, 0, 0) normal (0, 1, 0) x (-1, 0, 0)
  line L0 (-32.7, 15.15) -> (-32.7, -15.15) projected
  line L1 (-32.7, 26.5) -> (-32.7, -26.5) projected
  line L2 (-32.7, 21.5) -> (-35.5868, 26.5)
  line L3 (-32.7, 21.5) -> (-26.9265, 21.5) construction
  line L4 (-32.7, 21.5) -> (-50, 21.5)
  line L5 (-50, 26.5) -> (-50, -26.5) projected
  line L6 (-50, 21.5) -> (-47.1132, 26.5)
  line L7 (-32.7, 26.5) -> (-50, 26.5) projected
  line L8 (-50, 21.5) -> (-44.2265, 21.5) construction
  line L9 (-47.1132, 26.5) -> (-50, 26.5)
  line L10 (-50, 26.5) -> (-50, 21.5)
  line L11 (-32.7, 21.5) -> (-32.7, 26.5)
  line L12 (-35.5868, 26.5) -> (-32.7, 26.5)
  line L13 (18, 0) -> (-108, 0) projected
  point P0 (0, 0)
  dimension "d38" = 120
  dimension "d39" = 60
  dimension "d45" = 21.5
  dimension "d46" = 26.5
  dimension "d47" = 2.8868
revolve "Вращение2" cut sketch "Эскиз2" angle 360 about axis through (-10, 0, 0) along (1, 0, 0) contours L2 L7 L1 | L5 L7 L6
sketch "Эскиз3" plane through (0, 0, 0) normal (1, 0, 0) x (0, 1, 0)
  line L0 (0, 26.5) -> (22.9497, 13.25)
  line L1 (22.9497, 13.25) -> (22.9497, -13.25)
  line L2 (22.9497, -13.25) -> (0, -26.5)
  line L3 (0, -26.5) -> (-22.9497, -13.25)
  line L4 (-22.9497, -13.25) -> (-22.9497, 13.25)
  line L5 (-22.9497, 13.25) -> (0, 26.5)
  line L6 (0, 34.2752) -> (29.6832, 17.1376)
  line L7 (29.6832, 17.1376) -> (29.6832, -17.1376)
  line L8 (29.6832, -17.1376) -> (0, -34.2752)
  line L9 (0, -34.2752) -> (-29.6832, -17.1376)
  line L10 (-29.6832, -17.1376) -> (-29.6832, 17.1376)
  line L11 (-29.6832, 17.1376) -> (0, 34.2752)
  point P0 (0, 0)
  point P1 (0, 0)
  point P2 (0, 0)
  point P3 (0, 0)
  dimension "d41" = 6.7335
  dimension "d42" = 52.6329
extrude "Выдавливание1" cut sketch "Эскиз3" along normal blind 271
chamfer "Фаска1" distance 2 angle 45 1 edges at (90, -21, 0)
chamfer "Фаска2" distance 1.5 angle 45 1 edges at (90, -16.5, 0)
chamfer "Фаска3" distance 2 angle 45 1 edges at (0, -15.15, 0)
chamfer "Фаска4" distance 1 angle 45 1 edges at (0, -8, 0)
thread "Резьба1" size "G30.201x1.814" designation "G 7/8" class "A" standard "DIN Pipe Threads" length 27
thread "Резьба2" size "M42x1.5" class "6g" standard "ANSI Metric M Profile" length 27
thread "Резьба3" size "M33x3.5" class "6H" standard "ANSI Metric M Profile" length 27
properties part number "Штуцер"
